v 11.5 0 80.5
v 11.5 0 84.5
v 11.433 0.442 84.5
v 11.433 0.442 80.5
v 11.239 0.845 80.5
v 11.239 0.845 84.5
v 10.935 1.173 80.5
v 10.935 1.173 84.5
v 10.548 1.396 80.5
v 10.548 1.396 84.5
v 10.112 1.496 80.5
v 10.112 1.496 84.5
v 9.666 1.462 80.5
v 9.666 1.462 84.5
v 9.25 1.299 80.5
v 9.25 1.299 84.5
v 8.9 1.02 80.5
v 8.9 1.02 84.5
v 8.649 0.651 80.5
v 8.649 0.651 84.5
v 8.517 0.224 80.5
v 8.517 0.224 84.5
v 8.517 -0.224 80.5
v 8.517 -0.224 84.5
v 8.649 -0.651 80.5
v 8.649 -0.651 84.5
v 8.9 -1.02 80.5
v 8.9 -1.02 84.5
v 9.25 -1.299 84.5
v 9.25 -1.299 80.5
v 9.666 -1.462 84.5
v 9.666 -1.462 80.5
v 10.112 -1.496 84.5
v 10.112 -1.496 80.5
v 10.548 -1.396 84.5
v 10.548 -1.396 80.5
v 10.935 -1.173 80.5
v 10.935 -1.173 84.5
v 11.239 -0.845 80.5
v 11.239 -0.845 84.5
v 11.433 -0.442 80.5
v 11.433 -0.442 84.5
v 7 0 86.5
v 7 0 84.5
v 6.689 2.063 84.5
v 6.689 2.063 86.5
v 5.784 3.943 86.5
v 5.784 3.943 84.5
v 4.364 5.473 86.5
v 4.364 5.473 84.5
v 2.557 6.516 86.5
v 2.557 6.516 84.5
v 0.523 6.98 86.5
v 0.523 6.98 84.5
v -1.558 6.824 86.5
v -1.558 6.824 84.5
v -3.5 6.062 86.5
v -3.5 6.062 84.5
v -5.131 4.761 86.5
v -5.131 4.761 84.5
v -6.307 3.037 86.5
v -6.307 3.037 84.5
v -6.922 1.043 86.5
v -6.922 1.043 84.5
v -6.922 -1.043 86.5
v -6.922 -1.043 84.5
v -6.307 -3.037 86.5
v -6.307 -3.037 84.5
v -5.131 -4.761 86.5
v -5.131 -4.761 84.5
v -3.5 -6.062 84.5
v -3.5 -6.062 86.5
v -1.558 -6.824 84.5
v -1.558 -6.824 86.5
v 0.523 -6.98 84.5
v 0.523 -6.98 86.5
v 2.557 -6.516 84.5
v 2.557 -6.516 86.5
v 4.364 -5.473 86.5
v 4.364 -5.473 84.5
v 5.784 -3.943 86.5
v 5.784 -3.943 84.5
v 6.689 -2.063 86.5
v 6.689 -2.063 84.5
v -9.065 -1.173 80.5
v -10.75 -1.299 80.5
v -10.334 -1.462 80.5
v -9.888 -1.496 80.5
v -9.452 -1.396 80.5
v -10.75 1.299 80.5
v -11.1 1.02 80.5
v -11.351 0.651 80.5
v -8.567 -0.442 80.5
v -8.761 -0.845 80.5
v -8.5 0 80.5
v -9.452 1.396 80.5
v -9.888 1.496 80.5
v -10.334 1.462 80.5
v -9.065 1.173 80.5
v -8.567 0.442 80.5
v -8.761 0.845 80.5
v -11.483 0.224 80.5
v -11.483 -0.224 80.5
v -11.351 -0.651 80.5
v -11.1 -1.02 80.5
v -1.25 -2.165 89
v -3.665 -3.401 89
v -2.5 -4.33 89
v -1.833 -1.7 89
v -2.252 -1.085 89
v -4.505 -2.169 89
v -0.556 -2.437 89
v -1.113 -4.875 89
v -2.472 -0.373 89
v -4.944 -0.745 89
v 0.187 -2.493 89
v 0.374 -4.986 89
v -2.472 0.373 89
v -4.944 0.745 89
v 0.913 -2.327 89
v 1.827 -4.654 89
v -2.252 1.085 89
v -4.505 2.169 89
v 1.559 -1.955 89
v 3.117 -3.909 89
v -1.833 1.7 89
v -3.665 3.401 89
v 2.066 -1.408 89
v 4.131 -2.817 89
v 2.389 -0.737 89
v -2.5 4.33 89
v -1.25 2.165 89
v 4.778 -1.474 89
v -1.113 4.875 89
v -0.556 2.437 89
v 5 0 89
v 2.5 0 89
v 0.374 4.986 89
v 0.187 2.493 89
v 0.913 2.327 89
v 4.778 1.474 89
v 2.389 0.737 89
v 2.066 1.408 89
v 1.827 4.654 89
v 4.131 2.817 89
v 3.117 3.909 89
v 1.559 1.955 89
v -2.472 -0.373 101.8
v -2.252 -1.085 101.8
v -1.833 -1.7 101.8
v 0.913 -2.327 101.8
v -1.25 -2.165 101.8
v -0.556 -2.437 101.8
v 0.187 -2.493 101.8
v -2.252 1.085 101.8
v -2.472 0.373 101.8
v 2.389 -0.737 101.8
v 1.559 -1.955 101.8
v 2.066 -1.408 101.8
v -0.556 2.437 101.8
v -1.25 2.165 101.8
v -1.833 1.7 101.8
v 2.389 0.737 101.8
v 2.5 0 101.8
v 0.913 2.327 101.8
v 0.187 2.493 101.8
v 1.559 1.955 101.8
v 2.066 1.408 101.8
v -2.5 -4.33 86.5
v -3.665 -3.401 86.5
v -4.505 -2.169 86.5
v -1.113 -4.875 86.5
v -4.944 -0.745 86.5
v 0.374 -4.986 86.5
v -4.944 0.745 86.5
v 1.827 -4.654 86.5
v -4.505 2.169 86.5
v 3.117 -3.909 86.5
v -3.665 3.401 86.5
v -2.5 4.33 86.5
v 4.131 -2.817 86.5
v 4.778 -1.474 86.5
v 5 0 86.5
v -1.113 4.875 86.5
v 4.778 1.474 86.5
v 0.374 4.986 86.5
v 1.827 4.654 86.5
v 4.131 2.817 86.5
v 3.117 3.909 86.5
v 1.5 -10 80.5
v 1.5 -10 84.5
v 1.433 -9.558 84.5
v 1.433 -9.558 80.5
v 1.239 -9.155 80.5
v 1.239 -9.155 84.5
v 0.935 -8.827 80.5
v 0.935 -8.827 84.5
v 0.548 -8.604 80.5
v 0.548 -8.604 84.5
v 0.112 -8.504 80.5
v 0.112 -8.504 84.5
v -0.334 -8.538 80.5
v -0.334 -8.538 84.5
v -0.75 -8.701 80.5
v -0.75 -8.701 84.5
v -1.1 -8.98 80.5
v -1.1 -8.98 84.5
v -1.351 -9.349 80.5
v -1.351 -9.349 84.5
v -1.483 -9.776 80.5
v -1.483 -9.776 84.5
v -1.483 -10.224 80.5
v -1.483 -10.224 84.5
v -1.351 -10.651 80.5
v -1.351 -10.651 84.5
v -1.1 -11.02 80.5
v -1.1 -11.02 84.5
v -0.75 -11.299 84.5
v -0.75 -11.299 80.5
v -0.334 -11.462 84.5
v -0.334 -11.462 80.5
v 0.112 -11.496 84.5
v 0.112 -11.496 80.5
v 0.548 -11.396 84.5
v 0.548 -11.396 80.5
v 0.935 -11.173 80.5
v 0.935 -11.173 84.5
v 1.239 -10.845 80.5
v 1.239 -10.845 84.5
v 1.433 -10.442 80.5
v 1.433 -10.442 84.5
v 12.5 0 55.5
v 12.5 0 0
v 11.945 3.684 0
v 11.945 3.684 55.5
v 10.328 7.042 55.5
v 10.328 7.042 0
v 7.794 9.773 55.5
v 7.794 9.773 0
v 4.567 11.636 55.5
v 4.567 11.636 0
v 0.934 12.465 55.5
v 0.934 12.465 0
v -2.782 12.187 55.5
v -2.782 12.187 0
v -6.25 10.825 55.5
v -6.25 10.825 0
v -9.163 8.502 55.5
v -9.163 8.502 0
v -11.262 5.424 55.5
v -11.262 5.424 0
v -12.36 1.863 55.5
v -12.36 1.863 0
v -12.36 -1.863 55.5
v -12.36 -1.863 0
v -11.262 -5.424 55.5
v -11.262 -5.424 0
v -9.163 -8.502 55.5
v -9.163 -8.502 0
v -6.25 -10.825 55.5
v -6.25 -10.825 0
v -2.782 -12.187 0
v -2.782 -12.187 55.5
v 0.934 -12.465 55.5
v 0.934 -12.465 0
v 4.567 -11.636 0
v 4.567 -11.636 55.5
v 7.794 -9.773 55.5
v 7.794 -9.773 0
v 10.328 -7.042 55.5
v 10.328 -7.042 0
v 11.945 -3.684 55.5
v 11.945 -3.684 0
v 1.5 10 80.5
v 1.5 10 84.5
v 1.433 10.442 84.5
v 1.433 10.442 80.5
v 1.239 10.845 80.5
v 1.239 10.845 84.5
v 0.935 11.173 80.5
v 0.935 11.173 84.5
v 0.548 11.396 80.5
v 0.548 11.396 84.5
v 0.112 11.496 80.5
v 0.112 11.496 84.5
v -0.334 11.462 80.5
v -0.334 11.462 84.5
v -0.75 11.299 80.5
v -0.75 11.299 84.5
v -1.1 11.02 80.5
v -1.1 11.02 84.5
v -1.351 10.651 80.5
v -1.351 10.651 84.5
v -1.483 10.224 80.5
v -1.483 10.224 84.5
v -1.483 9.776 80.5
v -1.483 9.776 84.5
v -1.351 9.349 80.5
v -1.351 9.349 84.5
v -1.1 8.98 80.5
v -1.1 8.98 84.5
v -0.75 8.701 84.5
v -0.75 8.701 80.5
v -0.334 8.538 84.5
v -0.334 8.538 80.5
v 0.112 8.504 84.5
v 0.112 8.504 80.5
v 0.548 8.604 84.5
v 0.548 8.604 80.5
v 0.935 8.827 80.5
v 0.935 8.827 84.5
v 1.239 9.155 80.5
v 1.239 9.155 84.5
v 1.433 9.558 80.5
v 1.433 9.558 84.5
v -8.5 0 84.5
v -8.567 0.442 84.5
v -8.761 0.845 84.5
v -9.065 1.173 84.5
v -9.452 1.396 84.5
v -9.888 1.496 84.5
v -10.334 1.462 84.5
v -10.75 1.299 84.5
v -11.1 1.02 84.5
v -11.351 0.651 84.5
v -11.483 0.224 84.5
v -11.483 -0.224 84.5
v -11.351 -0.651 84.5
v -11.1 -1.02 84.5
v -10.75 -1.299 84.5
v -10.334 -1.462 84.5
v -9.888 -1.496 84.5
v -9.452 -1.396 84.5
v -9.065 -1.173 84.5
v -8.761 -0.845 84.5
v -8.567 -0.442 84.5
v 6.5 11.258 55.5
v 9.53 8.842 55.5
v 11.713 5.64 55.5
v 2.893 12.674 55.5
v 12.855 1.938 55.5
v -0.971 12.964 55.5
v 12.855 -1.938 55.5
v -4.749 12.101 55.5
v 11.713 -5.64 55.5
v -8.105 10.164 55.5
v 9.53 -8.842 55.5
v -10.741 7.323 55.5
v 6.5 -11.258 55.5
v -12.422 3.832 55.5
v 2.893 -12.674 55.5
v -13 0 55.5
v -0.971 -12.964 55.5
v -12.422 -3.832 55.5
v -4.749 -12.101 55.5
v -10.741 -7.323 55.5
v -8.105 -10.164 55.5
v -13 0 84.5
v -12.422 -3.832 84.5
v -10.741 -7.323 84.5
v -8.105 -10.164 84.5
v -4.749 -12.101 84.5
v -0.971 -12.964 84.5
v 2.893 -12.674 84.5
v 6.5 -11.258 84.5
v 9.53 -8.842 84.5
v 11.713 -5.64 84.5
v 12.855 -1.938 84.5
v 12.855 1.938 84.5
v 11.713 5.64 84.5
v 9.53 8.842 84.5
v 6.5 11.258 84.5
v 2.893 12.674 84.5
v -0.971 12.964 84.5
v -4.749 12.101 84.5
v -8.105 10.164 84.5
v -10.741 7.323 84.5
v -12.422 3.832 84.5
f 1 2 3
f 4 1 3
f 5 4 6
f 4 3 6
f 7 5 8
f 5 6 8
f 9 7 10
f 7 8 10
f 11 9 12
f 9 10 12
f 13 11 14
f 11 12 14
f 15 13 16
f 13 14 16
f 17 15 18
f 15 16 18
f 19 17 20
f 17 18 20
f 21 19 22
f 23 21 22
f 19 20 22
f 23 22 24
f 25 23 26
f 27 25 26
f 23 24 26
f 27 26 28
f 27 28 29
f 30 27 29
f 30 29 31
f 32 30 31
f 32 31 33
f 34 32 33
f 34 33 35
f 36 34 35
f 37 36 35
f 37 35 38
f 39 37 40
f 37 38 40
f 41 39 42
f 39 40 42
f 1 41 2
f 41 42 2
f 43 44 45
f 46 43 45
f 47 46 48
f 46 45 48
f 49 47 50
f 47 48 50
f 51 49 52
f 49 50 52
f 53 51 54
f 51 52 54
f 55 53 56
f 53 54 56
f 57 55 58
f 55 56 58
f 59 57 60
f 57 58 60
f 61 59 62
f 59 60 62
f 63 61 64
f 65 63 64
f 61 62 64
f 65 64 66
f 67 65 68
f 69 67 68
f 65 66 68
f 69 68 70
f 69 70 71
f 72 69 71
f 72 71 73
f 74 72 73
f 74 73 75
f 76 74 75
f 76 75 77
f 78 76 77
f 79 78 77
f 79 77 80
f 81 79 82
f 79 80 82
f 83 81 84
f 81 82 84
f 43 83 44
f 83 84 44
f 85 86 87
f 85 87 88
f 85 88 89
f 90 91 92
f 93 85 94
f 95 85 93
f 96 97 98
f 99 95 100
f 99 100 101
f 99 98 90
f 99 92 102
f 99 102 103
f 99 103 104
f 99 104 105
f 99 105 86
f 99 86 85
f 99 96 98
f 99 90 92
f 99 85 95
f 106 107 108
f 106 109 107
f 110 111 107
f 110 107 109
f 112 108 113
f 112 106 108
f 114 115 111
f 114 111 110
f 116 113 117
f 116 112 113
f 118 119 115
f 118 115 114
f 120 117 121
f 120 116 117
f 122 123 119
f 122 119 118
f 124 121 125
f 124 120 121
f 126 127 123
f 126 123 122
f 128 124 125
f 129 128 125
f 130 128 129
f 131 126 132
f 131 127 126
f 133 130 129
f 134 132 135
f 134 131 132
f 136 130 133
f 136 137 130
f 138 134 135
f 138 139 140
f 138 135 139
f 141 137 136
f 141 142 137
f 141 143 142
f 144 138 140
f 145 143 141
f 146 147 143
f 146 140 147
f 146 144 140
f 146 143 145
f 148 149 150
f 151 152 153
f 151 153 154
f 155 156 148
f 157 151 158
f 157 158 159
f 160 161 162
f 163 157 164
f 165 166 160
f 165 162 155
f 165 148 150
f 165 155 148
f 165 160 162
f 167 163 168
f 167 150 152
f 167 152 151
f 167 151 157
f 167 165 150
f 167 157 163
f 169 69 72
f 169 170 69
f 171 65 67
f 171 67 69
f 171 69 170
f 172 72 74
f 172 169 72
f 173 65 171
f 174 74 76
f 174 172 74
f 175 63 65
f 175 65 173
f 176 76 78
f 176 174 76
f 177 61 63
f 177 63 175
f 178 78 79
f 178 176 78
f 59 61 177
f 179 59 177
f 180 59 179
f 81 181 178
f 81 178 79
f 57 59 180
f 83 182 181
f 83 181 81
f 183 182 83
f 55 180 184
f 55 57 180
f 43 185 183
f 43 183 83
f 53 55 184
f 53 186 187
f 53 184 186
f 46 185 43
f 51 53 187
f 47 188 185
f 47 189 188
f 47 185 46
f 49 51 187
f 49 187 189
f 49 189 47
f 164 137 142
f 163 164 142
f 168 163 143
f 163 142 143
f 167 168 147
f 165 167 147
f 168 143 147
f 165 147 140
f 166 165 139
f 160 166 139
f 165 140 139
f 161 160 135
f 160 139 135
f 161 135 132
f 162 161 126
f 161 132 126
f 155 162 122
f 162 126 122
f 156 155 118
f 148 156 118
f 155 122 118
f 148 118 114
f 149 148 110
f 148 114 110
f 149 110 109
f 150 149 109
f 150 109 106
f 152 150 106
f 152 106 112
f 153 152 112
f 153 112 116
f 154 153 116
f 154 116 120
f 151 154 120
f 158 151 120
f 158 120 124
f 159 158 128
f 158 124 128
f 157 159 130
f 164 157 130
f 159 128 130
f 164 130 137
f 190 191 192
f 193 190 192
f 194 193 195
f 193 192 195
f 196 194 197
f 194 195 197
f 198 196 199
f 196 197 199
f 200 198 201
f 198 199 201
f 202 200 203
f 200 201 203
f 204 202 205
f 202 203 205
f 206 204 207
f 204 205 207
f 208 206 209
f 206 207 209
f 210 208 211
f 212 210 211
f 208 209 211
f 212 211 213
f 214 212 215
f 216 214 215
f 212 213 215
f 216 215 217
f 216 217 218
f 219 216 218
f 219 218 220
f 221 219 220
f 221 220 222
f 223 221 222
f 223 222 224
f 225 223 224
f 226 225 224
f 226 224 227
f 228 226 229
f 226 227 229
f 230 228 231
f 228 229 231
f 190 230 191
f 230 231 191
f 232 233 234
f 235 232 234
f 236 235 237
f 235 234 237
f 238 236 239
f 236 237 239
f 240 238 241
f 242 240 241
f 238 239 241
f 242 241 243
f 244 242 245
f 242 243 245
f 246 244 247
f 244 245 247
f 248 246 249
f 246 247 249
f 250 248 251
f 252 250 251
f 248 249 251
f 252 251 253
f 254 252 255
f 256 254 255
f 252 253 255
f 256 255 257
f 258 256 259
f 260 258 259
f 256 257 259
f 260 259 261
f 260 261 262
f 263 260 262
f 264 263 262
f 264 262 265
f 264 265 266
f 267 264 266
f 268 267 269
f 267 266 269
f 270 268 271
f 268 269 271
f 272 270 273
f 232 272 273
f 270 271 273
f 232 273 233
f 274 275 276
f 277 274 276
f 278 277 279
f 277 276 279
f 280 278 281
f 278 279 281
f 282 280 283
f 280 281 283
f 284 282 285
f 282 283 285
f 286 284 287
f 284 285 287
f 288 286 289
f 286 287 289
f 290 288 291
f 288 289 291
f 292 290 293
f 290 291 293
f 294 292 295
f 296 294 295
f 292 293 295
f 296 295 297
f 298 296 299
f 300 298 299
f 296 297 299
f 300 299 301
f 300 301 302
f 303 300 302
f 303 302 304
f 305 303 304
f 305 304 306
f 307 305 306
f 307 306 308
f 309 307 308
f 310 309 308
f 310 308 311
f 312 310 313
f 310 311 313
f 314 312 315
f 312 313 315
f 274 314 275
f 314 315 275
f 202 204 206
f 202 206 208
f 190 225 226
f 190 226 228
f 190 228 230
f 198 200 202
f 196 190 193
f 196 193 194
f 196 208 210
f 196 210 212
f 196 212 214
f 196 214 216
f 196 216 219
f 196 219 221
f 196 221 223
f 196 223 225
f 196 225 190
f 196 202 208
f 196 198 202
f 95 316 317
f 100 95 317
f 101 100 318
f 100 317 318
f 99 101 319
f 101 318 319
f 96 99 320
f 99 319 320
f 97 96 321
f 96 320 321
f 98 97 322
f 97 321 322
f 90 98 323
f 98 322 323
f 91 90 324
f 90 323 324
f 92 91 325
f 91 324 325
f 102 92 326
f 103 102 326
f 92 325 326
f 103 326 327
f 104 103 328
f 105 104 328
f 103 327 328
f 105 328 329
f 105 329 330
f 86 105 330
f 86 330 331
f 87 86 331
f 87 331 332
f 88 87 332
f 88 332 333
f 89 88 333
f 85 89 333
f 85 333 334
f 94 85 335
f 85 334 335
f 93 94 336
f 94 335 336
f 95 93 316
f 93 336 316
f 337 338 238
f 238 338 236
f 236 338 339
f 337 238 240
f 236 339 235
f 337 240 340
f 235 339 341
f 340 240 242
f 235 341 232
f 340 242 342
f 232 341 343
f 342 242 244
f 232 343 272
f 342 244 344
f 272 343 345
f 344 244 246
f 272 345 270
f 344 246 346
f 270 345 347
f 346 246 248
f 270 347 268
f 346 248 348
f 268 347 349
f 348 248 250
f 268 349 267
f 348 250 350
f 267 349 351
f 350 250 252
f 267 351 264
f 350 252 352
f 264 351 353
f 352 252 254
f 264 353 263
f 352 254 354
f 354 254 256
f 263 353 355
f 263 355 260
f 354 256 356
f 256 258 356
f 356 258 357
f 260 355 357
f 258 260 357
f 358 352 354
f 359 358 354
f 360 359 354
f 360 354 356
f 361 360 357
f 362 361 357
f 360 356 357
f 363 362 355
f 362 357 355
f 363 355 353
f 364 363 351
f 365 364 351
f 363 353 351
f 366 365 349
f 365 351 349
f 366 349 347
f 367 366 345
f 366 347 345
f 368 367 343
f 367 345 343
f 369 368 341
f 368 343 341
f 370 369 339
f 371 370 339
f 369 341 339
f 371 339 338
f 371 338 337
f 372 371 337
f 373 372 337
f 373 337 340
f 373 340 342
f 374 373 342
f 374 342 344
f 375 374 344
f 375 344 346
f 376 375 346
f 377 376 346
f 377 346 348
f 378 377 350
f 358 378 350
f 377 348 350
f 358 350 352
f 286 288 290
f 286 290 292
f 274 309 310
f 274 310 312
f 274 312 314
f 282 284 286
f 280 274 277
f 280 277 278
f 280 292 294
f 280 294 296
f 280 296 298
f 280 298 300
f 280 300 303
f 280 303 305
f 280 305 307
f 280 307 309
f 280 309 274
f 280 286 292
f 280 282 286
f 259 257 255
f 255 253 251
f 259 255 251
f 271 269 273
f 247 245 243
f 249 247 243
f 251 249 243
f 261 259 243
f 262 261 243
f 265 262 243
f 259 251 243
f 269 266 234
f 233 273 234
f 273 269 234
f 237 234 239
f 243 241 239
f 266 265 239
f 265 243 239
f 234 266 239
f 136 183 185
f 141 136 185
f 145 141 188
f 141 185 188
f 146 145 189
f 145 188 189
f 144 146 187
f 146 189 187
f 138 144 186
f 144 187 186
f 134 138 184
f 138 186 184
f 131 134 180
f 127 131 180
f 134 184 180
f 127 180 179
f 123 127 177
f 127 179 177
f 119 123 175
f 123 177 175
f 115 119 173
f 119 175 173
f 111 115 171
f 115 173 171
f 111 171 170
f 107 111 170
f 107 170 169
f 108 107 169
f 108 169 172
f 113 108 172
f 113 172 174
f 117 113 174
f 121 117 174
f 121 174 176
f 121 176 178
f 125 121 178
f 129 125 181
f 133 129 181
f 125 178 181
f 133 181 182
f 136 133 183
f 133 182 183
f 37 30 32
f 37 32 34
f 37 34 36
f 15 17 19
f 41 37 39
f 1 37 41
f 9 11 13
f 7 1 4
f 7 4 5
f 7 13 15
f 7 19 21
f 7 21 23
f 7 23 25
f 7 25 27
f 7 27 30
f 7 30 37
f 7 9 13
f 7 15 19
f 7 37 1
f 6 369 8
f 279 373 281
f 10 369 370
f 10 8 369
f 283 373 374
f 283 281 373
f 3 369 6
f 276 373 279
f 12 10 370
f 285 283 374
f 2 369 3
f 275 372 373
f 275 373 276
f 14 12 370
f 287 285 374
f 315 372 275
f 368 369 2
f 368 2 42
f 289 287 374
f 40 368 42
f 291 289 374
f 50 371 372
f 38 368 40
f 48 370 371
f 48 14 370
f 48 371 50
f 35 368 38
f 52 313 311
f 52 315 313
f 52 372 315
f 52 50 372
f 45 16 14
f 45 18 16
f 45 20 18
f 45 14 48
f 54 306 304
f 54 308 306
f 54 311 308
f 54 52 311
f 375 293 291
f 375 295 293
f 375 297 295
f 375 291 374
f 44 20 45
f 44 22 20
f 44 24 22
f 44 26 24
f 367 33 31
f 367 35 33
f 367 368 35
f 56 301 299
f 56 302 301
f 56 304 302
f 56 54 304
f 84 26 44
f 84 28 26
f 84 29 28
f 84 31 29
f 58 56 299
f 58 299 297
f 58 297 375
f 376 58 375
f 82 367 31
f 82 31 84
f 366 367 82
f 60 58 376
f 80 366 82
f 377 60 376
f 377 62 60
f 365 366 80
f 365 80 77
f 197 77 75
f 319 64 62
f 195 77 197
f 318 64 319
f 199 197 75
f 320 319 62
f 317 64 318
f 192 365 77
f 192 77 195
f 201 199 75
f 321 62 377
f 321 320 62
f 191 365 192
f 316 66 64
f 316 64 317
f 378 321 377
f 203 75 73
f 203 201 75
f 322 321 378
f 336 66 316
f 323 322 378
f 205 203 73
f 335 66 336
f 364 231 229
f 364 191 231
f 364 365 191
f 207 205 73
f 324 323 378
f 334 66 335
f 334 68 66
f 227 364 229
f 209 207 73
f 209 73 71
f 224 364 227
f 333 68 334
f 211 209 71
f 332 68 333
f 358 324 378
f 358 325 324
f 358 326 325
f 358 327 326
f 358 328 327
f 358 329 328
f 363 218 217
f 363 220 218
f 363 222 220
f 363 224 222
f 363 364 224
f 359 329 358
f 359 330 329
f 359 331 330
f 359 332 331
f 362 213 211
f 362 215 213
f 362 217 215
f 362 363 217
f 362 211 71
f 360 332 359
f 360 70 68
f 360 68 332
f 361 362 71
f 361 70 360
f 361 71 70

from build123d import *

# Parameters (mm, degrees)
SKETCH_1_R          = 12.5
EXTRUDE_1_DEPTH     = 55.5
SKETCH_2_R          = 13
EXTRUDE_1_2_DEPTH   = 29
SKETCH_3_R          = 7
EXTRUDE_2_DEPTH     = 2
SKETCH_4_R          = 5
EXTRUDE_3_DEPTH     = 2.5
SKETCH_5_R          = 2.5
EXTRUDE_4_DEPTH     = 12.8
SKETCH_6_R          = 1.5
CUT_EXTRUDE_1_DEPTH = 4


with BuildPart() as part:
    # 스케치1 → Extrude 1 (new body)
    with BuildSketch(Plane.XY):
        Circle(SKETCH_1_R)
    extrude(amount=EXTRUDE_1_DEPTH)

    # 스케치2 → Extrude 1 2 (add)
    with BuildSketch(Plane.XY.offset(55.5)):
        with Locations(Location((0, 0, 0), (0, 0, 180))):
            Circle(SKETCH_2_R)
    extrude(amount=EXTRUDE_1_2_DEPTH)

    # 스케치3 → 보스-돌출2 (add)
    with BuildSketch(Plane.XY.offset(84.5)):
        Circle(SKETCH_3_R)
    extrude(amount=EXTRUDE_2_DEPTH)

    # 스케치4 → 보스-돌출3 (add)
    with BuildSketch(Plane.XY.offset(86.5)):
        Circle(SKETCH_4_R)
    extrude(amount=EXTRUDE_3_DEPTH)

    # 스케치5 → 보스-돌출4 (add)
    with BuildSketch(Plane.XY.offset(89)):
        Circle(SKETCH_5_R)
    extrude(amount=EXTRUDE_4_DEPTH)

    # 스케치6 → 컷-돌출1 (cut)
    with BuildSketch(Plane.XY.offset(84.5)):
        with Locations((0, 10)):
            Circle(SKETCH_6_R)
        with Locations((10, 0)):
            Circle(SKETCH_6_R)
        with Locations((0, -10)):
            Circle(SKETCH_6_R)
        with Locations((-10, 0)):
            Circle(SKETCH_6_R)
    extrude(amount=-CUT_EXTRUDE_1_DEPTH, mode=Mode.SUBTRACT)


solid = part.part
